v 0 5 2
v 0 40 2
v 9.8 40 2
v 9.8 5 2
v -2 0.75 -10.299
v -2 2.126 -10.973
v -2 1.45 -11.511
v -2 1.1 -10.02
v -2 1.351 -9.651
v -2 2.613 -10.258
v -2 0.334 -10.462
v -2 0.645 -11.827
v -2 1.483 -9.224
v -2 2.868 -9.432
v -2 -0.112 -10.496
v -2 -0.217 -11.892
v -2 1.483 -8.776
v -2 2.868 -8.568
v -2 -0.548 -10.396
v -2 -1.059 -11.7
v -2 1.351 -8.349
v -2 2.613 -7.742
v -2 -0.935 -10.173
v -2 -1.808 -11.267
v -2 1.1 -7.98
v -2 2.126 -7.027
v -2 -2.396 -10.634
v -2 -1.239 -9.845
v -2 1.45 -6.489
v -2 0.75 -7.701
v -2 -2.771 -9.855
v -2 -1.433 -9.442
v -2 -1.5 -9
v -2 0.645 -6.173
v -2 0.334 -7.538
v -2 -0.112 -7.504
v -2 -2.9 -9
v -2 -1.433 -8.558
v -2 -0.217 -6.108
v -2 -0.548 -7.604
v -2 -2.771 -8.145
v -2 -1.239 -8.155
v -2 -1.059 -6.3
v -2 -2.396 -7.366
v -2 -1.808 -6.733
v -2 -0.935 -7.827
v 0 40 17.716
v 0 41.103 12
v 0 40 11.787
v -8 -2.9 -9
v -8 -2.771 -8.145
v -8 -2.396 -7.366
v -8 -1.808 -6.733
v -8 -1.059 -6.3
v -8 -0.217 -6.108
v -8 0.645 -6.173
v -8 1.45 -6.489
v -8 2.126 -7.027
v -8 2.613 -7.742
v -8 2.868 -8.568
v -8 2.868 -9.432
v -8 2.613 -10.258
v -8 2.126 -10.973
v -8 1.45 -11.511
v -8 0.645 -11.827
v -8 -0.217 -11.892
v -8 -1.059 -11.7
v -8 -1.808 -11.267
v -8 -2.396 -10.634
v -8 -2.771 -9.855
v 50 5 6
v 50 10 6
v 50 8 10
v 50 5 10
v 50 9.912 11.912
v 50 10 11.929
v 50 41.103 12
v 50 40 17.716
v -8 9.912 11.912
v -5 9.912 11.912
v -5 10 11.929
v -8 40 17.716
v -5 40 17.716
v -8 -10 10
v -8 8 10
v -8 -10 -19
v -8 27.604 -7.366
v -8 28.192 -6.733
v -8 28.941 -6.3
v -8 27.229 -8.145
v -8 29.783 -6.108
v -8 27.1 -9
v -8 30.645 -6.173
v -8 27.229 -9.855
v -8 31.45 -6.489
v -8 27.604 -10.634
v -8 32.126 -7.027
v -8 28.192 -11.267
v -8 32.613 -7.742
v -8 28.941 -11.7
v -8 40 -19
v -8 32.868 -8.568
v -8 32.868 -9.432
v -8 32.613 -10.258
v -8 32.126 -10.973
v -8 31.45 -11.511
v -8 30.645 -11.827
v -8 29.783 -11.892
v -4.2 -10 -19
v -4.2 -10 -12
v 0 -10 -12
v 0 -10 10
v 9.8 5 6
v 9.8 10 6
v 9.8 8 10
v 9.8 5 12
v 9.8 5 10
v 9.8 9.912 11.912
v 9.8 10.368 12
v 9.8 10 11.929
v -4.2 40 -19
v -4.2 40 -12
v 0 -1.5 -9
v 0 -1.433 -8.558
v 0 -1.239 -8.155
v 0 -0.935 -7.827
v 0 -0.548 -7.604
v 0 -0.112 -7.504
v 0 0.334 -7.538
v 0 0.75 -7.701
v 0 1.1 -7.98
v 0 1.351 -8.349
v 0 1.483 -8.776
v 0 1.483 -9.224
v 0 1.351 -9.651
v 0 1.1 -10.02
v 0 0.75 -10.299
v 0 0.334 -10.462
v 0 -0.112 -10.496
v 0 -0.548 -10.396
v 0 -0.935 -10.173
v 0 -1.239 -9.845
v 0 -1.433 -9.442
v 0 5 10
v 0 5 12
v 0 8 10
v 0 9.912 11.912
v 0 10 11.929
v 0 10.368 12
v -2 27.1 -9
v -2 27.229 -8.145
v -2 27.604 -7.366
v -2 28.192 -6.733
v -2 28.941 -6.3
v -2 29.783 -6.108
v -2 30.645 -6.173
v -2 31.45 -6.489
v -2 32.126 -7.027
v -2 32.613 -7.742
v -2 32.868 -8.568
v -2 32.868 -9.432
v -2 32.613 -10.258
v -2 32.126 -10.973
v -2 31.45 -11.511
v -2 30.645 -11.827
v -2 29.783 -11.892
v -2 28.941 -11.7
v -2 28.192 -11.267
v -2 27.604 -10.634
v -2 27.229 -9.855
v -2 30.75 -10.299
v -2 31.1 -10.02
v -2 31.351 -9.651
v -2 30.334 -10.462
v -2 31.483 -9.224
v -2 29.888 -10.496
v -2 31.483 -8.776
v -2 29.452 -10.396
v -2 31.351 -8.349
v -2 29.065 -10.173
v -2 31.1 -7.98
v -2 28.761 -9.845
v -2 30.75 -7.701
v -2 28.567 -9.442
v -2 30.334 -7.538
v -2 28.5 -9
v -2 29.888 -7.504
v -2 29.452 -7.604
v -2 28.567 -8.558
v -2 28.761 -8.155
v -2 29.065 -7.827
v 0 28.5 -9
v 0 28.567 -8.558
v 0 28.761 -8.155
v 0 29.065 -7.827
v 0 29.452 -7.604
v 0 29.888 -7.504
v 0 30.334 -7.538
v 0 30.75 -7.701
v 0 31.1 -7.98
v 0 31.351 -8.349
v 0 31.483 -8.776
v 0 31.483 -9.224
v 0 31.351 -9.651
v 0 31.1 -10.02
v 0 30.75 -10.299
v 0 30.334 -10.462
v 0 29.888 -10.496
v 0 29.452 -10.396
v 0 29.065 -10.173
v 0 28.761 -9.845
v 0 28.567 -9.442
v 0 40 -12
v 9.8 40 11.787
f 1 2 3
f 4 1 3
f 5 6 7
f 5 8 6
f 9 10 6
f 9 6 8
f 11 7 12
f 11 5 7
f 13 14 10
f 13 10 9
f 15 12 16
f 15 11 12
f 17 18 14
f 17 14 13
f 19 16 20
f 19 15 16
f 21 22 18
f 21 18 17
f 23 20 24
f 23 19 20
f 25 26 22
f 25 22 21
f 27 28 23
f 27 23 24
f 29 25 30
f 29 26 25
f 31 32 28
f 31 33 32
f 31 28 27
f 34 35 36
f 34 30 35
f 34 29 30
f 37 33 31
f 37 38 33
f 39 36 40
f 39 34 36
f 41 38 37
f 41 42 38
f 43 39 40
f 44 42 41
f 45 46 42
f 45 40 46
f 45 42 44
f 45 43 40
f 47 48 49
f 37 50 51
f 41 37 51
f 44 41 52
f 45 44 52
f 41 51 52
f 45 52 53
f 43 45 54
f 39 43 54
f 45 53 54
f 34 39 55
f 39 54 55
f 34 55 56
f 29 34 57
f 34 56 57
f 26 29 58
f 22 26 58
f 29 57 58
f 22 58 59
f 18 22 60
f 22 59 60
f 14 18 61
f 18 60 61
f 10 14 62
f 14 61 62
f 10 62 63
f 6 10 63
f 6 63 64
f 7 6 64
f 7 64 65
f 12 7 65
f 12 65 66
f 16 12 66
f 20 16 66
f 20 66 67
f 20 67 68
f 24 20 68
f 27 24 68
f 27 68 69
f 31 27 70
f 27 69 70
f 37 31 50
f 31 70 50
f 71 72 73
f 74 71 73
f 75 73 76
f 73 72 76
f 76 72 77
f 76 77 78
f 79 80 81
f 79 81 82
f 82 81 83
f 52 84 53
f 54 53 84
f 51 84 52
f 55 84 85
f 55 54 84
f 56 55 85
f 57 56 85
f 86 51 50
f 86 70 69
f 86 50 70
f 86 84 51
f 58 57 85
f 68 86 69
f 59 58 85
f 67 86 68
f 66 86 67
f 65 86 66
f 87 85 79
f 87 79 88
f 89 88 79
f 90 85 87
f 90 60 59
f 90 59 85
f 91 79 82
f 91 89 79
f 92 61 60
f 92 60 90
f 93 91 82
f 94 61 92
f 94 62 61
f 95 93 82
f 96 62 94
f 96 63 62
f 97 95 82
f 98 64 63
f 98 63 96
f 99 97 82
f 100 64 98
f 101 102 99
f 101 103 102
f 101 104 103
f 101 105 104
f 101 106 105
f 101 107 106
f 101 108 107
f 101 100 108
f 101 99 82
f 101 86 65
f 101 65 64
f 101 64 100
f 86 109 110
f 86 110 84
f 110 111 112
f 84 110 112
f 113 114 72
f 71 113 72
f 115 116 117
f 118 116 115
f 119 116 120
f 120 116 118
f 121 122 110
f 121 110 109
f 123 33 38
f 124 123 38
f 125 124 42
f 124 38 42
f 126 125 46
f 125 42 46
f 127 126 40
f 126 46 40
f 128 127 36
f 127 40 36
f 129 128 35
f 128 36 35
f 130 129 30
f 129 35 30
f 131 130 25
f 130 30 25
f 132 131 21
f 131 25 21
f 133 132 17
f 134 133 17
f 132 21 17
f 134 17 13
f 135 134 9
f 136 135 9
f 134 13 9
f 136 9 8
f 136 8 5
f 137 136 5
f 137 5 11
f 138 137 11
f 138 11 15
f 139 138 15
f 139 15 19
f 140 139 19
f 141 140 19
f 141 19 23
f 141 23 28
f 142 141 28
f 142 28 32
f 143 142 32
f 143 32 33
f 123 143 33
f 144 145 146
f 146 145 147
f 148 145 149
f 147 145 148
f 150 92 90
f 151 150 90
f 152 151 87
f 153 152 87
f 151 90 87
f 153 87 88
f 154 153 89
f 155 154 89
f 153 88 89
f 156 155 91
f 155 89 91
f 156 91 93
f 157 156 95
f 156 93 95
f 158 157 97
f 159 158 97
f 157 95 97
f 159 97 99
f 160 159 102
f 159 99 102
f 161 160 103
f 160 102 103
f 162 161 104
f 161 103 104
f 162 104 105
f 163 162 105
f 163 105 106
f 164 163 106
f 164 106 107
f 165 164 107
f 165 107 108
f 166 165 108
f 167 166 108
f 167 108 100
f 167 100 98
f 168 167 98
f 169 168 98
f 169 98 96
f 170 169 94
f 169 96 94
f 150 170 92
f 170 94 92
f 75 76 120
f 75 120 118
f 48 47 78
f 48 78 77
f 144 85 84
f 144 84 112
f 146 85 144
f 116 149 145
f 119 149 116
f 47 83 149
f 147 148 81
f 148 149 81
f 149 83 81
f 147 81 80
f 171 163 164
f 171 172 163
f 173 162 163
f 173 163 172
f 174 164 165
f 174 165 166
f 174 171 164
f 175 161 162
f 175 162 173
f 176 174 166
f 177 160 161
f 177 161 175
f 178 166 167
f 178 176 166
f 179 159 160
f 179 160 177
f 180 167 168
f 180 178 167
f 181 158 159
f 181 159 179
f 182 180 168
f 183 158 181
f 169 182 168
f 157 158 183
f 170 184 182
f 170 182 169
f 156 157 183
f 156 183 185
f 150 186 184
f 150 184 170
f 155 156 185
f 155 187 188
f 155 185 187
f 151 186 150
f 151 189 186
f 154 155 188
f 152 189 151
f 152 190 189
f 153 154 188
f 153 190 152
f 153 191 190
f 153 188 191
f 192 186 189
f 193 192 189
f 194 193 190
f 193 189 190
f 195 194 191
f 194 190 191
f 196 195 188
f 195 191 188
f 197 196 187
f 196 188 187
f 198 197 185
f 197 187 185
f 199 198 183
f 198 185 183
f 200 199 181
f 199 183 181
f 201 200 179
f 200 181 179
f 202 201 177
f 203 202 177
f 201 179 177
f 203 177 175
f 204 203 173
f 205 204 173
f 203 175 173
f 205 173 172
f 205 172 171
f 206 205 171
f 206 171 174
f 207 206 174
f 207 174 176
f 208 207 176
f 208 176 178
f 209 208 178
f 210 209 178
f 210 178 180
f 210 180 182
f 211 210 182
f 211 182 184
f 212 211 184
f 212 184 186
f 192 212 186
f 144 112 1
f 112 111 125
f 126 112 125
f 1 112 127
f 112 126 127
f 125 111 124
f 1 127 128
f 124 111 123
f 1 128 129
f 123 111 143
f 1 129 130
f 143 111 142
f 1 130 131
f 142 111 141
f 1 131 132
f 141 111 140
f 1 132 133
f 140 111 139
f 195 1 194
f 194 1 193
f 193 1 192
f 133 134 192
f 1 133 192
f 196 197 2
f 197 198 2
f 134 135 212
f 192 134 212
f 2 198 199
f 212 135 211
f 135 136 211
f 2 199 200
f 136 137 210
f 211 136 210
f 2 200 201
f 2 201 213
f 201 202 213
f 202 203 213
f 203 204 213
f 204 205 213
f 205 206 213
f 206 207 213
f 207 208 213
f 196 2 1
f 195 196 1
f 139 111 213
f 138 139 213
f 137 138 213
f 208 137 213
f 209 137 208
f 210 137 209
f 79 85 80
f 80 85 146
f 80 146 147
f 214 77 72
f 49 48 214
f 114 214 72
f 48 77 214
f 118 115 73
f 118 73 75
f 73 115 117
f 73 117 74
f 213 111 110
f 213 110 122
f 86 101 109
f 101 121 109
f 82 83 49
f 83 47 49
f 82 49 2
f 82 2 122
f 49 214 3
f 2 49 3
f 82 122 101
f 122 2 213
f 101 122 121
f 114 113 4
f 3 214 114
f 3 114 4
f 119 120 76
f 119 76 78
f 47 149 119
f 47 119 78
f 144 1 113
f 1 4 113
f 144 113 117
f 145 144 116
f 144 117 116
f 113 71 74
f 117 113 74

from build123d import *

# Parameters (mm, degrees)
EXTRUDE_1_DEPTH      = 50
SKETCH_2_W           = 50
SKETCH_2_H           = 10
EXTRUDE_2_DEPTH      = 10
SKETCH_3_W           = 10
SKETCH_3_H           = 20
EXTRUDE_3_DEPTH      = 20
SKETCH_4_W           = 20
SKETCH_4_H           = 10
EXTRUDE_4_DEPTH      = 30
CUT_EXTRUDE_1_DEPTH  = 50
CHAMFER_1_SIZE       = 2
SKETCH_9_R           = 1.5
CUT_EXTRUDE_2_DEPTH  = 66.493778942
CUT_EXTRUDE_4_DEPTH  = 6
SKETCH_13_W          = 4
SKETCH_13_H          = 6
EXTRUDE_12_DEPTH     = 18
SKETCH_14_W          = 20
SKETCH_14_H          = 20
EXTRUDE_13_DEPTH     = 6
CUT_EXTRUDE_START    = -20
SKETCH_15_W          = 50
SKETCH_15_H          = 6
CUT_EXTRUDE_5_DEPTH  = 20
SKETCH_16_W          = 4
SKETCH_16_H          = 4
CUT_EXTRUDE_7_DEPTH  = 18
EXTRUDE_14_REACH     = 68.163
SKETCH_17_W          = 5
SKETCH_17_H          = 30
SKETCH_18_W          = 50
SKETCH_18_H          = 4
EXTRUDE_15_DEPTH     = 18
CUT_EXTRUDE_8_REACH  = 67.494
SKETCH_19_W          = 60
SKETCH_19_H          = 10
SKETCH_20_R          = 1.5
CUT_EXTRUDE_9_DEPTH  = 4
CHAMFER_2_SIZE       = 2
SKETCH_21_W          = 15
SKETCH_21_H          = 50
CUT_EXTRUDE_10_DEPTH = 10
SKETCH_22_W          = 5
SKETCH_22_H          = 50
EXTRUDE_16_DEPTH     = 19
SKETCH_23_W          = 7
SKETCH_23_H          = 50
CUT_EXTRUDE_11_DEPTH = 4.2
EXTRUDE_17_DEPTH     = 3
SKETCH_25_R          = 1.5
CUT_EXTRUDE_12_DEPTH = 8
SKETCH_26_R          = 2.9
CUT_EXTRUDE_13_DEPTH = 6
CUT_EXTRUDE_14_REACH = 67.988
SKETCH_27_W          = 4
SKETCH_27_H          = 10
SKETCH_29_W          = 8
SKETCH_29_H          = 10
EXTRUDE_18_DEPTH     = 6
SKETCH_30_W          = 50
SKETCH_30_H          = 5
CUT_EXTRUDE_15_DEPTH = 4
EXTRUDE_19_REACH     = 75.219
SKETCH_31_W          = 9.8
SKETCH_31_H          = 10


with BuildPart() as part:
    # 草图1 → 凸台-拉伸1 (new body)
    with BuildSketch(Plane(origin=(0, 0, 0), x_dir=(0, 0, -1), z_dir=(1, 0, 0))):
        Polygon((0, 0), (-10, 0), (-17.716362436, 40), (-12, 41.102738109), (-6, 10), (0, 10), align=None)
    extrude(amount=EXTRUDE_1_DEPTH)

    # 草图2 → 凸台-拉伸2 (add)
    with BuildSketch(Plane.XZ):
        with Locations((25, 5)):
            Rectangle(SKETCH_2_W, SKETCH_2_H)
    extrude(amount=EXTRUDE_2_DEPTH)

    # 草图3 → 凸台-拉伸3 (add)
    with BuildSketch(Plane.ZY):
        with Locations((5, 0)):
            Rectangle(SKETCH_3_W, SKETCH_3_H)
    extrude(amount=EXTRUDE_3_DEPTH)

    # 草图4 → 凸台-拉伸4 (add)
    with BuildSketch(Plane(origin=(0, 10, 0), x_dir=(1, 0, 0), z_dir=(0, 1, 0))):
        with Locations((-10, -5)):
            Rectangle(SKETCH_4_W, SKETCH_4_H)
    extrude(amount=EXTRUDE_4_DEPTH)

    # 草图5 → 切除-拉伸1 (cut)
    with BuildSketch(Plane(origin=(50, 0, 0), x_dir=(0, 0, -1), z_dir=(1, 0, 0))):
        Polygon((-10, 10), (-11.929090609, 10), (-10, 0), align=None)
    extrude(amount=-CUT_EXTRUDE_1_DEPTH, mode=Mode.SUBTRACT)

    # 倒角1
    # the kernel refuses this chamfer: 2 mm, written as the material it adds along each edge
    with BuildSketch(Plane(origin=(50, 10, 10), x_dir=(0, 0.027495876610586487, 0.9996219169112968), z_dir=(-1, 0, 0))) as chamfer_1_piece_1_section:
        Polygon((CHAMFER_1_SIZE * 0.999621916911, -CHAMFER_1_SIZE * 0.0274958766106), (-CHAMFER_1_SIZE * 0.0274958766106, -CHAMFER_1_SIZE * 0.999621916911), (0, 0), align=None)
    chamfer_1_piece_1 = extrude(amount=50, mode=Mode.PRIVATE)
    chamfer_1_piece_1 = split(chamfer_1_piece_1, bisect_by=Plane(origin=(25, 9.122791872, 11.759869213), z_dir=(0, 0.18941678522713282, -0.9818967774029093)), keep=Keep.TOP, mode=Mode.PRIVATE)
    add(chamfer_1_piece_1)

    # 草图9 → 切除-拉伸2 (cut, through all)
    with BuildSketch(Plane.XY.offset(10)):
        with Locations((-10, 30)):
            Circle(SKETCH_9_R)
        with Locations((30, 0)):
            Circle(SKETCH_9_R)
    extrude(amount=-CUT_EXTRUDE_2_DEPTH, mode=Mode.SUBTRACT)

    # 草图12 → 切除-拉伸4 (cut)
    with BuildSketch(Plane.XY.offset(10)):
        Polygon((0, 30.73515874), (0, 40), (-20, 40), (-20, -10), (50, -10), (50, 8), (0, 8), align=None)
    extrude(amount=-CUT_EXTRUDE_4_DEPTH, mode=Mode.SUBTRACT)

    # 草图13 → 凸台-拉伸12 (add)
    with BuildSketch(Plane.XZ.offset(-8)):
        with Locations((2, 7)):
            Rectangle(SKETCH_13_W, SKETCH_13_H)
        with Locations((48, 7)):
            Rectangle(SKETCH_13_W, SKETCH_13_H)
    extrude(amount=EXTRUDE_12_DEPTH)

    # 草图14 → 凸台-拉伸13 (add)
    with BuildSketch(Plane.XY.offset(4)):
        with Locations((-10, 0)):
            Rectangle(SKETCH_14_W, SKETCH_14_H)
    extrude(amount=EXTRUDE_13_DEPTH)

    # 草图15 → 切除-拉伸5 (cut)
    with BuildSketch(Plane(origin=(0, 10, 0), x_dir=(1, 0, 0), z_dir=(0, 1, 0)).offset(CUT_EXTRUDE_START)):
        with Locations((25, -3)):
            Rectangle(SKETCH_15_W, SKETCH_15_H)
    extrude(amount=CUT_EXTRUDE_5_DEPTH, mode=Mode.SUBTRACT)

    # 草图16 → 切除-拉伸7 (cut)
    with BuildSketch(Plane.XZ.offset(10)):
        with Locations((2, 8)):
            Rectangle(SKETCH_16_W, SKETCH_16_H)
        with Locations((48, 8)):
            Rectangle(SKETCH_16_W, SKETCH_16_H)
    extrude(amount=-CUT_EXTRUDE_7_DEPTH, mode=Mode.SUBTRACT)

    # 凸台-拉伸14: up to this plane
    extrude_14_end = Plane(origin=(50, 0, 10), z_dir=(0, 0.1894167852271328, -0.9818967774029093))
    # 草图17 → 凸台-拉伸14 (add, up to the surface)
    with BuildSketch(Plane.XY.offset(4), mode=Mode.PRIVATE) as extrude_14_sk1:
        with Locations((-2.5, 25)):
            Rectangle(SKETCH_17_W, SKETCH_17_H)
    extrude_14_tool1 = split(extrude(extrude_14_sk1.sketch, amount=EXTRUDE_14_REACH, mode=Mode.PRIVATE), bisect_by=extrude_14_end, keep=Keep.BOTH, mode=Mode.PRIVATE)
    add(extrude_14_tool1.solids().sort_by_distance((-2.5, 25, 4))[0])

    # 草图18 → 凸台-拉伸15 (add)
    with BuildSketch(Plane.XZ.offset(-8)):
        with Locations((25, 8)):
            Rectangle(SKETCH_18_W, SKETCH_18_H)
    extrude(amount=EXTRUDE_15_DEPTH)

    # 切除-拉伸8: up to this face of the body (flat: up to its plane)
    cut_extrude_8_end = Plane(part.part.faces().sort_by_distance((-12.539896603, 24.920206795, 4))[0])
    # 草图19 → 切除-拉伸8 (cut, up to the picked face)
    with BuildSketch(Plane.XY.offset(10), mode=Mode.PRIVATE) as cut_extrude_8_sk1:
        with Locations((10, 0)):
            Rectangle(SKETCH_19_W, SKETCH_19_H)
    cut_extrude_8_tool1 = split(extrude(cut_extrude_8_sk1.sketch, amount=-CUT_EXTRUDE_8_REACH, mode=Mode.PRIVATE), bisect_by=cut_extrude_8_end, keep=Keep.BOTH, mode=Mode.PRIVATE)
    add(cut_extrude_8_tool1.solids().sort_by(Axis((10, 0, 10), (0, 0, -1)))[0], mode=Mode.SUBTRACT)

    # 草图20 → 切除-拉伸9 (cut)
    with BuildSketch(Plane.XY.offset(4)):
        with Locations((-10, 0)):
            Circle(SKETCH_20_R)
    extrude(amount=-CUT_EXTRUDE_9_DEPTH, mode=Mode.SUBTRACT)

    # 倒角2
    # the kernel refuses this chamfer: 2 mm, written as the material it adds along each edge
    with BuildSketch(Plane(origin=(5.143365976, 10, 10), x_dir=(0, -0.9996219169112968, -0.027495876610586487), z_dir=(-1, 0, 0))) as chamfer_2_piece_1_section:
        Polygon((CHAMFER_2_SIZE * 0.999621916911, CHAMFER_2_SIZE * 0.0274958766106), (-CHAMFER_2_SIZE * 0.0274958766106, CHAMFER_2_SIZE * 0.999621916911), (0, 0), align=None)
    chamfer_2_piece_1 = extrude(amount=10.143365976, mode=Mode.PRIVATE)
    chamfer_2_piece_1 = split(chamfer_2_piece_1, bisect_by=Plane(origin=(-2.5, 9.121127045, 11.759548053), z_dir=(0, 0.18941678522698793, -0.9818967774029372)), keep=Keep.TOP, mode=Mode.PRIVATE)
    add(chamfer_2_piece_1)

    # 草图21 → 切除-拉伸10 (cut)
    with BuildSketch(Plane.XY.offset(10)):
        with Locations((-12.5, 15)):
            Rectangle(SKETCH_21_W, SKETCH_21_H)
    extrude(amount=-CUT_EXTRUDE_10_DEPTH, mode=Mode.SUBTRACT)

    # 草图22 → 凸台-拉伸16 (add)
    with BuildSketch(Plane(origin=(0, 0, 0), x_dir=(-1, 0, 0), z_dir=(0, 0, -1))):
        with Locations((2.5, 15)):
            Rectangle(SKETCH_22_W, SKETCH_22_H)
    extrude(amount=EXTRUDE_16_DEPTH)

    # 草图23 → 切除-拉伸11 (cut)
    with BuildSketch(Plane(origin=(0, 0, 0), x_dir=(0, 0, -1), z_dir=(1, 0, 0))):
        with Locations((15.5, 15)):
            Rectangle(SKETCH_23_W, SKETCH_23_H)
    extrude(amount=-CUT_EXTRUDE_11_DEPTH, mode=Mode.SUBTRACT)

    # 草图24 → 凸台-拉伸17 (add)
    with BuildSketch(Plane.ZY.offset(5)):
        Polygon((17.716362436, 40), (-19, 40), (-19, -10), (10, -10), (10, -5), (4, -5), (4, 5), (10, 5), (10, 8), (11.912142006, 9.912142006), align=None)
    extrude(amount=EXTRUDE_17_DEPTH)

    # 草图25 → 切除-拉伸12 (cut)
    with BuildSketch(Plane.ZY.offset(8)):
        with Locations(Location((-9, 30, 0), (0, 0, 270))):
            Circle(SKETCH_25_R)
        with Locations(Location((-9, 0, 0), (0, 0, 270))):
            Circle(SKETCH_25_R)
    extrude(amount=-CUT_EXTRUDE_12_DEPTH, mode=Mode.SUBTRACT)

    # 草图26 → 切除-拉伸13 (cut)
    with BuildSketch(Plane.ZY.offset(8)):
        with Locations(Location((-9, 30, 0), (0, 0, 270))):
            Circle(SKETCH_26_R)
        with Locations(Location((-9, 0, 0), (0, 0, 270))):
            Circle(SKETCH_26_R)
    extrude(amount=-CUT_EXTRUDE_13_DEPTH, mode=Mode.SUBTRACT)

    # 草图27 → 切除-拉伸14 (cut, up to next)
    with BuildSketch(Plane.ZY.offset(-40), mode=Mode.PRIVATE) as cut_extrude_14_sk1:
        with Locations((8, 0)):
            Rectangle(SKETCH_27_W, SKETCH_27_H)
    cut_extrude_14_tool1 = extrude(cut_extrude_14_sk1.sketch, amount=-CUT_EXTRUDE_14_REACH, mode=Mode.PRIVATE) & part.part
    add(cut_extrude_14_tool1.solids().sort_by_distance((40, 0, 8))[0], mode=Mode.SUBTRACT)

    # 草图29 → 凸台-拉伸18 (add)
    with BuildSketch(Plane.XY.offset(4)):
        with Locations((-4, 0)):
            Rectangle(SKETCH_29_W, SKETCH_29_H)
    extrude(amount=EXTRUDE_18_DEPTH)

    # 草图30 → 切除-拉伸15 (cut)
    with BuildSketch(Plane.XY.offset(10)):
        with Locations((25, -7.5)):
            Rectangle(SKETCH_30_W, SKETCH_30_H)
    extrude(amount=-CUT_EXTRUDE_15_DEPTH, mode=Mode.SUBTRACT)

    # 凸台-拉伸19: up to this face of the body (flat: up to its plane)
    extrude_19_end = Plane(part.part.faces().sort_by_distance((25, 5, 8))[0])
    # 草图31 → 凸台-拉伸19 (add, up to the picked face)
    with BuildSketch(Plane(origin=(0, 40, 0), x_dir=(1, 0, 0), z_dir=(0, 1, 0)), mode=Mode.PRIVATE) as extrude_19_sk1:
        with Locations((4.9, -7)):
            Rectangle(SKETCH_31_W, SKETCH_31_H)
    extrude_19_tool1 = split(extrude(extrude_19_sk1.sketch, amount=-EXTRUDE_19_REACH, mode=Mode.PRIVATE), bisect_by=extrude_19_end, keep=Keep.BOTH, mode=Mode.PRIVATE)
    add(extrude_19_tool1.solids().sort_by(Axis((4.9, 40, 7), (0, -1, 0)))[0])


solid = part.part
